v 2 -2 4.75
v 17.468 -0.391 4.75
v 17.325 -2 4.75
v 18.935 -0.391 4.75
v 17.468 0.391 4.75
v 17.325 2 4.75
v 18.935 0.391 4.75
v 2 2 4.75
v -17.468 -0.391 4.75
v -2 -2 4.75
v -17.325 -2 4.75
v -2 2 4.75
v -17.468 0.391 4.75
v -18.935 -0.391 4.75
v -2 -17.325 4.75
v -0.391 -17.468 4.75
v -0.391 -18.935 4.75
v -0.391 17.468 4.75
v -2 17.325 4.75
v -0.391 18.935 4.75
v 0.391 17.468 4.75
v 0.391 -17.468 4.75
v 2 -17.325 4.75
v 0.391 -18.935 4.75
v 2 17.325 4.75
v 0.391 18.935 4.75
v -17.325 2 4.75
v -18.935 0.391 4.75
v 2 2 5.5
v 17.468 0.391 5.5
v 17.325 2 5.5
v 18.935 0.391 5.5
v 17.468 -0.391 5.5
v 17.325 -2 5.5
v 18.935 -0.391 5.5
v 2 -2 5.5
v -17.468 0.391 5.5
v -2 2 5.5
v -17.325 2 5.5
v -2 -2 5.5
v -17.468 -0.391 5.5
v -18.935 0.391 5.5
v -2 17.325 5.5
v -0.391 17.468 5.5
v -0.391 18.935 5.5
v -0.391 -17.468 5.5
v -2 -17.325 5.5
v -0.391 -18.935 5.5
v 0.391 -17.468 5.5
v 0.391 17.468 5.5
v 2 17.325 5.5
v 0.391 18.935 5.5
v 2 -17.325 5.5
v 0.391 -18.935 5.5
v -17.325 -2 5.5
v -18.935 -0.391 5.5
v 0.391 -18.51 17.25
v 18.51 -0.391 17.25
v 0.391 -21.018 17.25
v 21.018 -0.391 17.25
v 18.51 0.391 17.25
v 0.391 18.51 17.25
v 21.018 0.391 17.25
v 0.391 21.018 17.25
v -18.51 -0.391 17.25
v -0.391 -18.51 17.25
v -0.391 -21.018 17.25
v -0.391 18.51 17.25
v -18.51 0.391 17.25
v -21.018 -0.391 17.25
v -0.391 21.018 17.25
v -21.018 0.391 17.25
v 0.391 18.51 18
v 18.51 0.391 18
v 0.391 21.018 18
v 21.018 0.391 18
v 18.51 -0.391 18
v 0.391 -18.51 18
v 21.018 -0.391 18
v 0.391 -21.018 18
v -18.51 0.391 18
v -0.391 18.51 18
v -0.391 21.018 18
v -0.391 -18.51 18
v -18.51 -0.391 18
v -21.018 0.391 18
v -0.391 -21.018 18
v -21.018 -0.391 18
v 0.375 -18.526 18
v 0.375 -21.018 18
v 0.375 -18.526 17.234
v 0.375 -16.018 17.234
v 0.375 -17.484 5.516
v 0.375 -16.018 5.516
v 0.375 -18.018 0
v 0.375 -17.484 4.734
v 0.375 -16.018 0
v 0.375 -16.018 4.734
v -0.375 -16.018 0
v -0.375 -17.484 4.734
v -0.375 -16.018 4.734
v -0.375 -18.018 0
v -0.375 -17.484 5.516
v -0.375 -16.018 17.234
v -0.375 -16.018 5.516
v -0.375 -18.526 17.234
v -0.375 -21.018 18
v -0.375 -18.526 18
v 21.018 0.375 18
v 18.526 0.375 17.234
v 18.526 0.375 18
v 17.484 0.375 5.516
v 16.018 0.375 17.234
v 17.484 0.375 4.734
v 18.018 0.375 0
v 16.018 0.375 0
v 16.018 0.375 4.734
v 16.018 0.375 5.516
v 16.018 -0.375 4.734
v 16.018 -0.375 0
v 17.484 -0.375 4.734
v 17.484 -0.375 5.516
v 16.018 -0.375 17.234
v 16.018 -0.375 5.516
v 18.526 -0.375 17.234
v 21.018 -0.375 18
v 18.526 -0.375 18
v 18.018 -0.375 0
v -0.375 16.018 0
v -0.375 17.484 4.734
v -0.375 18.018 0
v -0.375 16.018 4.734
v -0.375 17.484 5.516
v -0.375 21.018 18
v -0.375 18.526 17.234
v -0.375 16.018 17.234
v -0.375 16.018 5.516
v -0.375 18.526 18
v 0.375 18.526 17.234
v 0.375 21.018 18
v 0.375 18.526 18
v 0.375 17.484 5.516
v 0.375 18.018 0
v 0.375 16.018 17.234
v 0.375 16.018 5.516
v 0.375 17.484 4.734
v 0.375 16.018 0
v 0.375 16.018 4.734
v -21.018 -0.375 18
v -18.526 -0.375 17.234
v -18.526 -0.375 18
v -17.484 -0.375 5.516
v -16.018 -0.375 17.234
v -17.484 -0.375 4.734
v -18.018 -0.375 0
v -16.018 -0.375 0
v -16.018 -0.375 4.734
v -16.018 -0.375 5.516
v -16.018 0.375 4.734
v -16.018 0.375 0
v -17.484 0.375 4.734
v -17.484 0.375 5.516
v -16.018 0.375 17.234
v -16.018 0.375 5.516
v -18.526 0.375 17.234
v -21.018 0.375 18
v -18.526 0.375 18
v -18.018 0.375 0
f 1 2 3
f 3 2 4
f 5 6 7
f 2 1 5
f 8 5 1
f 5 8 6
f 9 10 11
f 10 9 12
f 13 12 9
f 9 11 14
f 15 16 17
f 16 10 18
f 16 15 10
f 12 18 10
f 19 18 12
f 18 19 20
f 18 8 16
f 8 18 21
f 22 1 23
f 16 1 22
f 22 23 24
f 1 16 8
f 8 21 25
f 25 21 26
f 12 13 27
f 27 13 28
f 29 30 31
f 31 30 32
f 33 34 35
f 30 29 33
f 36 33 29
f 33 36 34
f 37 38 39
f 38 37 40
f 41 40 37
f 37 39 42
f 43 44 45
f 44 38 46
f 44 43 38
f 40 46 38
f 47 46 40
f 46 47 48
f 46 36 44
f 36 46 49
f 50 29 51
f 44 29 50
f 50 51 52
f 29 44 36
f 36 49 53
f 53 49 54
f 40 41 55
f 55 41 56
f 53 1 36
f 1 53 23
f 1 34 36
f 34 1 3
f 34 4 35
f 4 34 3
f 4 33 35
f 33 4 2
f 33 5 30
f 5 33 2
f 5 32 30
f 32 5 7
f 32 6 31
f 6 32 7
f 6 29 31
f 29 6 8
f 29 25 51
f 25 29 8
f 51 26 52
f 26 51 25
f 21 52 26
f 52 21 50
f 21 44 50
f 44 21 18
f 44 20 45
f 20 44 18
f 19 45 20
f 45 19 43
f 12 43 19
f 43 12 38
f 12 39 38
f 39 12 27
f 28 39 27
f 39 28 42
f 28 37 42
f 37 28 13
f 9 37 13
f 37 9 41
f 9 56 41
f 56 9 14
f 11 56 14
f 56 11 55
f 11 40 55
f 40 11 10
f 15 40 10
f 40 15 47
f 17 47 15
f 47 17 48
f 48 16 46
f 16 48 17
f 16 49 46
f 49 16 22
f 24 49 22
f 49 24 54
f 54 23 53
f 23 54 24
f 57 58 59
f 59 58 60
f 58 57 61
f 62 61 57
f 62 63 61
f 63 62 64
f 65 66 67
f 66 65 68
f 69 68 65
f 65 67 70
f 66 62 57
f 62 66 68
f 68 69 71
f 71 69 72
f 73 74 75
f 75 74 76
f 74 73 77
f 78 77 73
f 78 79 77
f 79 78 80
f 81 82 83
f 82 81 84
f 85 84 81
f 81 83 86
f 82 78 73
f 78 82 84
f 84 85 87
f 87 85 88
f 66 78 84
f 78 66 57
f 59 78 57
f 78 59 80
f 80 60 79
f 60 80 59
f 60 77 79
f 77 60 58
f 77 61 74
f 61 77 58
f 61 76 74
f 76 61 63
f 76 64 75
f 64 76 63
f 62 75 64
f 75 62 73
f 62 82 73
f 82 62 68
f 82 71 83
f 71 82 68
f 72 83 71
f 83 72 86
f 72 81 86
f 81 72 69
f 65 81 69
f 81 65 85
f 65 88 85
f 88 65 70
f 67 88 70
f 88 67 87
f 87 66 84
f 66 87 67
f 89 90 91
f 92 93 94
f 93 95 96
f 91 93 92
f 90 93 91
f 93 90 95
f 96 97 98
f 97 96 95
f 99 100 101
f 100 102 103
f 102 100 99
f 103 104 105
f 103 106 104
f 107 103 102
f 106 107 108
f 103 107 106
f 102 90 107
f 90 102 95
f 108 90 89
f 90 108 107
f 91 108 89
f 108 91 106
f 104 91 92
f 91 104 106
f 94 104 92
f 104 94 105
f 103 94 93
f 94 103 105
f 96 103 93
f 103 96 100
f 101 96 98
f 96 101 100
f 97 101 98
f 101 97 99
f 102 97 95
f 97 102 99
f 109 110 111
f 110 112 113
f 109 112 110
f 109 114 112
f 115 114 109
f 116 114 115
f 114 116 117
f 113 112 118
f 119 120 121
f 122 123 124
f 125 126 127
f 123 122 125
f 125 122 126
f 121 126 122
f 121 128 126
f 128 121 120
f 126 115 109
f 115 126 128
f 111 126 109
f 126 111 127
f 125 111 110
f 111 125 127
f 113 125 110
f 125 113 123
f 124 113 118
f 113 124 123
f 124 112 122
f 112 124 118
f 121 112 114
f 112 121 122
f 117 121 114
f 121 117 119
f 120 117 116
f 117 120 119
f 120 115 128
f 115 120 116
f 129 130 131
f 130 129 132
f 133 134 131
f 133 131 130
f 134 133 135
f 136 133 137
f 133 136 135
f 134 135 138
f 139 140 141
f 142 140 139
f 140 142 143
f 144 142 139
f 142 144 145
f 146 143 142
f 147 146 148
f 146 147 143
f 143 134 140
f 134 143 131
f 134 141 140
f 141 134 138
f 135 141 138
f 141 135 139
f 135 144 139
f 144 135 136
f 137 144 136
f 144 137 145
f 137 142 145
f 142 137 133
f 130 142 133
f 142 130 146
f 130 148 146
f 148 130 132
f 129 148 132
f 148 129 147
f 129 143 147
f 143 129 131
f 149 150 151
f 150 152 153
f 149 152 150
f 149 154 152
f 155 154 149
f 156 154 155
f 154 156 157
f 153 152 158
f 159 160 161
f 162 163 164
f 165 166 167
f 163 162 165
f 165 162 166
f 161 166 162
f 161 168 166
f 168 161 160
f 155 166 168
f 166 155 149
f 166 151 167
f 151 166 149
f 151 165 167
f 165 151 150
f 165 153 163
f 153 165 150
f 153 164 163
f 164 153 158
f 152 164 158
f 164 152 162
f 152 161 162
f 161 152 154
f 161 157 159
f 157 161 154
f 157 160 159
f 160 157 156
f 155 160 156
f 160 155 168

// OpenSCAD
// file: ../src/functions.scad
module shelf(type, diameter,leg_width) {
    if (type == 0)
    round_shelf(diameter, leg_width);
    if (type == 1)
    square_shelf(diameter, leg_width);
    if (type == 2)
    square_shelf_leg_supports(diameter, leg_width);
}

module round_shelf(diameter,leg_width) {
    difference() {
        circle(d=diameter);
        leg_slots(diameter, leg_width);
    }
}

module square_shelf(diameter,leg_width) {
    difference() {
        hull() {
            leg_slots(diameter, leg_width);
        }
        leg_slots(diameter, leg_width);
    }
}

module square_shelf_leg_supports(diameter,leg_width) {
    intersection() {
        square_shelf(diameter, leg_width);
        for(i=[0:leg_count-1]) {
            rotate(i*360/leg_count)
            translate([-leg_support/2,-diameter/2])
            square([leg_support,diameter/2]);
        }
    }
}


module leg_slots(diameter, leg_width) {
    for(i=[0:leg_count-1]) {
        rotate(i*360/leg_count)
        translate([-leg_thick/2-gap,-diameter/2])
        square([leg_thick+gapp,leg_width]);
    }
}

module shelf_number(i) {
        shelf(shelves[i], tan(leg_angle)*((top_height-leg_height)/(shelf_count-1)*i+leg_height)*2+bottom,(tan(leg_angle)*((top_height-leg_height)/(shelf_count-1)*i+leg_height)+min_leg)/2+gap/2);
}

module assemble_shelves() {
    for(i=[0:shelf_count-1]) {
        translate([0,0,(top_height-leg_height)/(shelf_count-1)*i+leg_height-plywood])
        linear_extrude(height=plywood)
        shelf_number(i);
    }
}

module assemble_legs() {
    for(i=[0:leg_count-1]) {
        rotate(i*360/leg_count)
        translate([-leg_thick/2-plywood/2,0,0])
        for(l=[1:leg_layers]) {
            translate([plywood*l,0,0])
            leg_3d();
        }
    }
}

//shelf(bottom,min_leg);

module leg() {
    difference() {
        square([min_leg+(top-bottom)/2,top_height]);
        translate([min_leg,0])
        rotate(-leg_angle)
        square([min_leg+(top-bottom),top_height*2]);
        for(i=[0:shelf_count-1]) {
            translate([0,(top_height-leg_height)/(shelf_count-1)*i+leg_height-plywood-gap])
            square([(tan(leg_angle)*((top_height-leg_height)/(shelf_count-1)*i+leg_height)+min_leg)/2+gap/2,plywood+gapp]);
        }
            
    }
}

module leg_3d() {
    translate([0,-bottom/2+min_leg,0])
    rotate([90,0,-90])
    translate([0,0,-plywood/2])
    color("lime")
    linear_extrude(height=plywood)
    leg();
}

module assemble() {
    assemble_shelves();
    assemble_legs();
}

module plate() {
    for(i=[0:leg_count/2-1]) {
        translate([i*((top-bottom)/2+min_leg*2+tree*2),0]) {
            leg();
            translate([min_leg+(top-bottom)/2+tree+min_leg,top_height])
            rotate(180)
            leg();
        }
    }
    if(leg_count%2 != 0) {
            translate([floor(leg_count/2)*((top-bottom)/2+min_leg*2+tree*2),0])
            leg();
    }
    translate([0,-top/2-tree])
    for(i=[0:shelf_count-1]) {
        //too much math, I can drag in inkscape
        translate([top*i,0])
        shelf_number(i);
    }
}
// main file
include <../src/functions.scad>;

square_top=30;
shelves = [2, 1];
// 0 = round
// 1 = square
// 2 = leg_supports (square)
shelf_count = len(shelves);
leg_layers=1;
leg_count = 4;
leg_height = 5.5; // bottom shelf
top_height = 18; //top to ground
min_leg = 2; //smallest size a leg can be
plywood = 0.75;
gap = 1/64;
gapp = gap*2;
pad = 0.1;
padd = pad*2;
leg_thick=plywood*leg_layers;

leg_support=4+sin($t*360)*3;

tree=2;

top = sqrt(2*pow((square_top/2),2))*2-leg_thick/2-gap; //diameter
bottom = top-6; //diameter
leg_angle = atan((top-bottom)/2/top_height);
echo("top is", top);

$fn=120;


// RENDER gif
module demo() {
    assemble();
}

demo();
